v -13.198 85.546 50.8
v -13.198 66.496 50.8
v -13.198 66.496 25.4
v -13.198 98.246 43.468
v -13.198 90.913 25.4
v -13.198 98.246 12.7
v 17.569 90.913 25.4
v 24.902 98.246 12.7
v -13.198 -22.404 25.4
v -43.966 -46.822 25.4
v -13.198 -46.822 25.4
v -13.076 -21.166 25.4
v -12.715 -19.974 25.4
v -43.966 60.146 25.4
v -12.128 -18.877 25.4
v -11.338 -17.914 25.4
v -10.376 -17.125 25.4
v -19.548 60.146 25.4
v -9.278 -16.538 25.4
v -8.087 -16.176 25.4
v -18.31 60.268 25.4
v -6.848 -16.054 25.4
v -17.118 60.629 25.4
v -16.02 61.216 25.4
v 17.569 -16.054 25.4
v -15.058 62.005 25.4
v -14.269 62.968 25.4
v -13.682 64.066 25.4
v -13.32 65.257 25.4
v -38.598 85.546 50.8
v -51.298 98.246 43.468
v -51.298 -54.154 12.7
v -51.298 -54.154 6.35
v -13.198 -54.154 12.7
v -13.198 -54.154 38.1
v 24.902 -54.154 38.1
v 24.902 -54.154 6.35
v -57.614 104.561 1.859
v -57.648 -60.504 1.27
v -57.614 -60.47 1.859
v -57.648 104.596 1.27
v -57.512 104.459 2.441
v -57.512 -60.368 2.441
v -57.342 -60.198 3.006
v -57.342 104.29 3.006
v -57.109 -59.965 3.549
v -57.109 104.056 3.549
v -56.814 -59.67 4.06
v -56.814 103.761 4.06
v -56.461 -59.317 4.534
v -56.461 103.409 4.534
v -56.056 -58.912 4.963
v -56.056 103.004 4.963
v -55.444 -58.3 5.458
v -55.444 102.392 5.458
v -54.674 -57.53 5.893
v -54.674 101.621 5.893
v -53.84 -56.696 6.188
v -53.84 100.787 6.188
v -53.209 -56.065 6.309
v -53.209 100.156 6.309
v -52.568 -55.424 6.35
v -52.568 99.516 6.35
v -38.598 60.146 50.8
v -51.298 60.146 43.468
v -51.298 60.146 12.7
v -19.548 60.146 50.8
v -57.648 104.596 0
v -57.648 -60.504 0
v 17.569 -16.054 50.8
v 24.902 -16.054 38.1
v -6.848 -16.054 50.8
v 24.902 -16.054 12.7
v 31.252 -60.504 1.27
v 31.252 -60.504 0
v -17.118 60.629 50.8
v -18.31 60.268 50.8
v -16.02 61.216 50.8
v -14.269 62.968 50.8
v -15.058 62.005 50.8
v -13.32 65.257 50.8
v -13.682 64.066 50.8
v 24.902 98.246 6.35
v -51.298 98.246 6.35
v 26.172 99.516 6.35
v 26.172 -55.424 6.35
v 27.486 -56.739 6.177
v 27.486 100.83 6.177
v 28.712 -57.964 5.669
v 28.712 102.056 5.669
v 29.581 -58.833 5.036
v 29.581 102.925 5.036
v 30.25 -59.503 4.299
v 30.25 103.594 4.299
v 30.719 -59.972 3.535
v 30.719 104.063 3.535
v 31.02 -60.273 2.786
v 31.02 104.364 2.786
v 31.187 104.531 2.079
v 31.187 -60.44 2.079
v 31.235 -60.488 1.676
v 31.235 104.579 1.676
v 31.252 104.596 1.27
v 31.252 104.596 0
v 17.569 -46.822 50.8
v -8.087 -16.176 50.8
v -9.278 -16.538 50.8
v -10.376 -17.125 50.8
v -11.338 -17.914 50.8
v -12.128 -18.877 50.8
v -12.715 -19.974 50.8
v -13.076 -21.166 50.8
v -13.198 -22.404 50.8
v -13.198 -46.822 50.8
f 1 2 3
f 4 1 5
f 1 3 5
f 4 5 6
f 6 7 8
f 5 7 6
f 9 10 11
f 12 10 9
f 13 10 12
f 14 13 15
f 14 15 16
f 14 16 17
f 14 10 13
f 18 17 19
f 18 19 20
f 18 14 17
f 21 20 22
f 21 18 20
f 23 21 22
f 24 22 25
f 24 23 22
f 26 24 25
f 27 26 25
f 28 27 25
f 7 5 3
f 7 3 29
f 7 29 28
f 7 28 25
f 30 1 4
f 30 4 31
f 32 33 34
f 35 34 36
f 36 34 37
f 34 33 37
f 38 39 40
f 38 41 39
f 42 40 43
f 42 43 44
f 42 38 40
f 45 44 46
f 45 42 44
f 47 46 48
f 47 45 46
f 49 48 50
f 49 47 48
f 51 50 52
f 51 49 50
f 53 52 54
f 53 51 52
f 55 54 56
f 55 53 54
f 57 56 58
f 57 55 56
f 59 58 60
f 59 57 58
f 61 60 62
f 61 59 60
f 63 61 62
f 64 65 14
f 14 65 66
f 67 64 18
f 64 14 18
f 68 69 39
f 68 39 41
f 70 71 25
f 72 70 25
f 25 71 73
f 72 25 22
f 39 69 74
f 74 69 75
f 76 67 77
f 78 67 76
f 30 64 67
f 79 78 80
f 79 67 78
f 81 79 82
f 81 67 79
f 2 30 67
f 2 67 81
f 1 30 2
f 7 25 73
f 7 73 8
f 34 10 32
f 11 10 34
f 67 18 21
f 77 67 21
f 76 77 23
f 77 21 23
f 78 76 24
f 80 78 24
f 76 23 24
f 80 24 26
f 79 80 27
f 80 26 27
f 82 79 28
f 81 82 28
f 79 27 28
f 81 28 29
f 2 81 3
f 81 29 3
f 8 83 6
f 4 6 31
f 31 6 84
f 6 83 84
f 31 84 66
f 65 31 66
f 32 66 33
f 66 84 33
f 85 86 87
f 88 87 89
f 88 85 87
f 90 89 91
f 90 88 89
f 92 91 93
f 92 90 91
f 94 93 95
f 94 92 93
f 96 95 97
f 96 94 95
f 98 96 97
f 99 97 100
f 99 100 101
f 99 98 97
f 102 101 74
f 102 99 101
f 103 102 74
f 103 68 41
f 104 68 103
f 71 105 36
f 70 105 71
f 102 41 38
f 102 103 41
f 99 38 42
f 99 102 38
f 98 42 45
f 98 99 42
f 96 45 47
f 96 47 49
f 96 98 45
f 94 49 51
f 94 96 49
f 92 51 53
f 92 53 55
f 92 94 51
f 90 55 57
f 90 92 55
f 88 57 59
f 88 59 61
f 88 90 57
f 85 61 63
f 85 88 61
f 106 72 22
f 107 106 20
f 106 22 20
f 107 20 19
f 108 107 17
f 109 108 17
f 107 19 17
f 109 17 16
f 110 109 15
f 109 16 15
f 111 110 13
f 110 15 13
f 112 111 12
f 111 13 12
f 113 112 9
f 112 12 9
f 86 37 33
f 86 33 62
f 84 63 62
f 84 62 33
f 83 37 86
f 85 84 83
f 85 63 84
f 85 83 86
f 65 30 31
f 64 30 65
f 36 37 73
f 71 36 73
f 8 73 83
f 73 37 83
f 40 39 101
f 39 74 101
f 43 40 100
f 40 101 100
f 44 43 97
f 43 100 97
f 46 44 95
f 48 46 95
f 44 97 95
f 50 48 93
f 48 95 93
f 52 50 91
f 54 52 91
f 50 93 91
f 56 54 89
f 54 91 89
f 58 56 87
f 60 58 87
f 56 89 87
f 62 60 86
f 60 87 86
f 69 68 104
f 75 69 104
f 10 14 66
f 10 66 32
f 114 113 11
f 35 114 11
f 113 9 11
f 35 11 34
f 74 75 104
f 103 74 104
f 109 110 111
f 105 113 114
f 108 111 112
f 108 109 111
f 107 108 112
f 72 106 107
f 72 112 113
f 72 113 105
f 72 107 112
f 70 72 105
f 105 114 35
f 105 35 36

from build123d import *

# Parameters (mm, degrees)
F1_DEPTH    = 25.4
F2_DEPTH    = 50.8
F0_W        = 88.9
F0_H        = 165.1
F3_DEPTH    = 6.35
F4_R        = 5.08
F5_SIZE2    = 7.3323484187
F5_SIZE     = 12.7
F6_C1_SIZE2 = 12.7
F6_C1_SIZE  = 7.3323484187
F6_C2_SIZE2 = 7.3323484187
F6_C2_SIZE  = 12.7
F6_C3_SIZE2 = 12.7
F6_C3_SIZE  = 7.3323484187
F6_C4_SIZE2 = 7.3323484187
F6_C4_SIZE  = 12.7


with BuildPart() as f1:
    # F0 (on Top) → F1 (new body)
    with BuildSketch(Plane.XY):
        with BuildLine():
            Line((-19.5483354544, 60.1456080113), (-51.2983354544, 60.1456080113))
            Line((-51.2983354544, 60.1456080113), (-51.2983354544, -54.1543919887))
            Line((-51.2983354544, -54.1543919887), (-13.1983354544, -54.1543919887))
            Line((-13.1983354544, -54.1543919887), (-13.1983354544, -22.4043919887))
            ThreePointArc((-13.1983354544, -22.4043919887), (-11.3384635149, -17.9142639282), (-6.8483354544, -16.0543919887))
            Line((-6.8483354544, -16.0543919887), (24.9016645456, -16.0543919887))
            Line((24.9016645456, -16.0543919887), (24.9016645456, 98.2456080113))
            Line((24.9016645456, 98.2456080113), (-13.1983354544, 98.2456080113))
            Line((-13.1983354544, 98.2456080113), (-13.1983354544, 66.4956080113))
            ThreePointArc((-13.1983354544, 66.4956080113), (-15.0582073938, 62.0054799508), (-19.5483354544, 60.1456080113))
        make_face()
    extrude(amount=F1_DEPTH)

    # F0 (on Top) → F2 (join)
    with BuildSketch(Plane.XY):
        with BuildLine():
            Line((-13.1983354544, 98.2456080113), (-51.2983354544, 98.2456080113))
            Line((-51.2983354544, 98.2456080113), (-51.2983354544, 60.1456080113))
            Line((-51.2983354544, 60.1456080113), (-19.5483354544, 60.1456080113))
            ThreePointArc((-19.5483354544, 60.1456080113), (-15.0582073938, 62.0054799508), (-13.1983354544, 66.4956080113))
            Line((-13.1983354544, 66.4956080113), (-13.1983354544, 98.2456080113))
        make_face()
        with BuildLine():
            Line((-13.1983354544, -22.4043919887), (-13.1983354544, -54.1543919887))
            Line((-13.1983354544, -54.1543919887), (24.9016645456, -54.1543919887))
            Line((24.9016645456, -54.1543919887), (24.9016645456, -16.0543919887))
            Line((24.9016645456, -16.0543919887), (-6.8483354544, -16.0543919887))
            ThreePointArc((-6.8483354544, -16.0543919887), (-11.3384635149, -17.9142639282), (-13.1983354544, -22.4043919887))
        make_face()
    extrude(amount=F2_DEPTH)

    # F0 (on Top) → F3 (join)
    with BuildSketch(Plane.XY):
        with Locations((-13.1983354544, 22.0456080113)):
            Rectangle(F0_W, F0_H)
        Polygon((-51.2983354544, 60.1456080113), (-51.2983354544, 98.2456080113), (-13.1983354544, 98.2456080113), (24.9016645456, 98.2456080113), (24.9016645456, -16.0543919887), (24.9016645456, -54.1543919887), (-13.1983354544, -54.1543919887), (-51.2983354544, -54.1543919887), align=None, mode=Mode.SUBTRACT)
    extrude(amount=F3_DEPTH)

    # F4
    f4_edges = [f1.edges().sort_by_distance(p)[0] for p in [
        (31.251665, 22.045608, 6.35),
        (-13.198335, -60.504392, 6.35),
        (-57.648335, 22.045608, 6.35),
        (-13.198335, 104.595608, 6.35),
    ]]
    fillet(f4_edges, radius=F4_R)

    # F5
    f5_edges = [f1.edges().sort_by_distance(p)[0] for p in [
        (24.901665, 41.095608, 25.4),
        (5.851665, 98.245608, 25.4),
        (-51.298335, 2.995608, 25.4),
        (-32.248335, -54.154392, 25.4),
    ]]
    chamfer(f5_edges, length=F5_SIZE, length2=F5_SIZE2)

    # F6: chamfer of 12.7 x 7.3323484187 on 4 edges, made by hand

    # F6_c1
    f6_c1_edges = [f1.edges().sort_by_distance(p)[0] for p in [
        (-51.2983354544, 79.1956080113, 50.8),
    ]]
    f6_c1_side = f1.faces().sort_by_distance((-51.2983354544, 79.1956080113, 50.6533530316))[0]
    chamfer(f6_c1_edges, length=F6_C1_SIZE, length2=F6_C1_SIZE2, reference=f6_c1_side)

    # F6_c2
    f6_c2_edges = [f1.edges().sort_by_distance(p)[0] for p in [
        (5.8516645456, -54.1543919887, 50.8),
    ]]
    f6_c2_side = f1.faces().sort_by_distance((5.8516645456, -54.1543919887, 50.6533530316))[0]
    chamfer(f6_c2_edges, length=F6_C2_SIZE, length2=F6_C2_SIZE2, reference=f6_c2_side)

    # F6_c3
    f6_c3_edges = [f1.edges().sort_by_distance(p)[0] for p in [
        (-25.8983354544, 98.2456080113, 50.8),
    ]]
    f6_c3_side = f1.faces().sort_by_distance((-25.8983354544, 98.2456080113, 50.6533530316))[0]
    chamfer(f6_c3_edges, length=F6_C3_SIZE, length2=F6_C3_SIZE2, reference=f6_c3_side)

    # F6_c4
    f6_c4_edges = [f1.edges().sort_by_distance(p)[0] for p in [
        (24.9016645456, -31.4382177794, 50.8),
    ]]
    f6_c4_side = f1.faces().sort_by_distance((24.9016645456, -31.4382177794, 50.6533530316))[0]
    chamfer(f6_c4_edges, length=F6_C4_SIZE, length2=F6_C4_SIZE2, reference=f6_c4_side)


solid = f1.part
